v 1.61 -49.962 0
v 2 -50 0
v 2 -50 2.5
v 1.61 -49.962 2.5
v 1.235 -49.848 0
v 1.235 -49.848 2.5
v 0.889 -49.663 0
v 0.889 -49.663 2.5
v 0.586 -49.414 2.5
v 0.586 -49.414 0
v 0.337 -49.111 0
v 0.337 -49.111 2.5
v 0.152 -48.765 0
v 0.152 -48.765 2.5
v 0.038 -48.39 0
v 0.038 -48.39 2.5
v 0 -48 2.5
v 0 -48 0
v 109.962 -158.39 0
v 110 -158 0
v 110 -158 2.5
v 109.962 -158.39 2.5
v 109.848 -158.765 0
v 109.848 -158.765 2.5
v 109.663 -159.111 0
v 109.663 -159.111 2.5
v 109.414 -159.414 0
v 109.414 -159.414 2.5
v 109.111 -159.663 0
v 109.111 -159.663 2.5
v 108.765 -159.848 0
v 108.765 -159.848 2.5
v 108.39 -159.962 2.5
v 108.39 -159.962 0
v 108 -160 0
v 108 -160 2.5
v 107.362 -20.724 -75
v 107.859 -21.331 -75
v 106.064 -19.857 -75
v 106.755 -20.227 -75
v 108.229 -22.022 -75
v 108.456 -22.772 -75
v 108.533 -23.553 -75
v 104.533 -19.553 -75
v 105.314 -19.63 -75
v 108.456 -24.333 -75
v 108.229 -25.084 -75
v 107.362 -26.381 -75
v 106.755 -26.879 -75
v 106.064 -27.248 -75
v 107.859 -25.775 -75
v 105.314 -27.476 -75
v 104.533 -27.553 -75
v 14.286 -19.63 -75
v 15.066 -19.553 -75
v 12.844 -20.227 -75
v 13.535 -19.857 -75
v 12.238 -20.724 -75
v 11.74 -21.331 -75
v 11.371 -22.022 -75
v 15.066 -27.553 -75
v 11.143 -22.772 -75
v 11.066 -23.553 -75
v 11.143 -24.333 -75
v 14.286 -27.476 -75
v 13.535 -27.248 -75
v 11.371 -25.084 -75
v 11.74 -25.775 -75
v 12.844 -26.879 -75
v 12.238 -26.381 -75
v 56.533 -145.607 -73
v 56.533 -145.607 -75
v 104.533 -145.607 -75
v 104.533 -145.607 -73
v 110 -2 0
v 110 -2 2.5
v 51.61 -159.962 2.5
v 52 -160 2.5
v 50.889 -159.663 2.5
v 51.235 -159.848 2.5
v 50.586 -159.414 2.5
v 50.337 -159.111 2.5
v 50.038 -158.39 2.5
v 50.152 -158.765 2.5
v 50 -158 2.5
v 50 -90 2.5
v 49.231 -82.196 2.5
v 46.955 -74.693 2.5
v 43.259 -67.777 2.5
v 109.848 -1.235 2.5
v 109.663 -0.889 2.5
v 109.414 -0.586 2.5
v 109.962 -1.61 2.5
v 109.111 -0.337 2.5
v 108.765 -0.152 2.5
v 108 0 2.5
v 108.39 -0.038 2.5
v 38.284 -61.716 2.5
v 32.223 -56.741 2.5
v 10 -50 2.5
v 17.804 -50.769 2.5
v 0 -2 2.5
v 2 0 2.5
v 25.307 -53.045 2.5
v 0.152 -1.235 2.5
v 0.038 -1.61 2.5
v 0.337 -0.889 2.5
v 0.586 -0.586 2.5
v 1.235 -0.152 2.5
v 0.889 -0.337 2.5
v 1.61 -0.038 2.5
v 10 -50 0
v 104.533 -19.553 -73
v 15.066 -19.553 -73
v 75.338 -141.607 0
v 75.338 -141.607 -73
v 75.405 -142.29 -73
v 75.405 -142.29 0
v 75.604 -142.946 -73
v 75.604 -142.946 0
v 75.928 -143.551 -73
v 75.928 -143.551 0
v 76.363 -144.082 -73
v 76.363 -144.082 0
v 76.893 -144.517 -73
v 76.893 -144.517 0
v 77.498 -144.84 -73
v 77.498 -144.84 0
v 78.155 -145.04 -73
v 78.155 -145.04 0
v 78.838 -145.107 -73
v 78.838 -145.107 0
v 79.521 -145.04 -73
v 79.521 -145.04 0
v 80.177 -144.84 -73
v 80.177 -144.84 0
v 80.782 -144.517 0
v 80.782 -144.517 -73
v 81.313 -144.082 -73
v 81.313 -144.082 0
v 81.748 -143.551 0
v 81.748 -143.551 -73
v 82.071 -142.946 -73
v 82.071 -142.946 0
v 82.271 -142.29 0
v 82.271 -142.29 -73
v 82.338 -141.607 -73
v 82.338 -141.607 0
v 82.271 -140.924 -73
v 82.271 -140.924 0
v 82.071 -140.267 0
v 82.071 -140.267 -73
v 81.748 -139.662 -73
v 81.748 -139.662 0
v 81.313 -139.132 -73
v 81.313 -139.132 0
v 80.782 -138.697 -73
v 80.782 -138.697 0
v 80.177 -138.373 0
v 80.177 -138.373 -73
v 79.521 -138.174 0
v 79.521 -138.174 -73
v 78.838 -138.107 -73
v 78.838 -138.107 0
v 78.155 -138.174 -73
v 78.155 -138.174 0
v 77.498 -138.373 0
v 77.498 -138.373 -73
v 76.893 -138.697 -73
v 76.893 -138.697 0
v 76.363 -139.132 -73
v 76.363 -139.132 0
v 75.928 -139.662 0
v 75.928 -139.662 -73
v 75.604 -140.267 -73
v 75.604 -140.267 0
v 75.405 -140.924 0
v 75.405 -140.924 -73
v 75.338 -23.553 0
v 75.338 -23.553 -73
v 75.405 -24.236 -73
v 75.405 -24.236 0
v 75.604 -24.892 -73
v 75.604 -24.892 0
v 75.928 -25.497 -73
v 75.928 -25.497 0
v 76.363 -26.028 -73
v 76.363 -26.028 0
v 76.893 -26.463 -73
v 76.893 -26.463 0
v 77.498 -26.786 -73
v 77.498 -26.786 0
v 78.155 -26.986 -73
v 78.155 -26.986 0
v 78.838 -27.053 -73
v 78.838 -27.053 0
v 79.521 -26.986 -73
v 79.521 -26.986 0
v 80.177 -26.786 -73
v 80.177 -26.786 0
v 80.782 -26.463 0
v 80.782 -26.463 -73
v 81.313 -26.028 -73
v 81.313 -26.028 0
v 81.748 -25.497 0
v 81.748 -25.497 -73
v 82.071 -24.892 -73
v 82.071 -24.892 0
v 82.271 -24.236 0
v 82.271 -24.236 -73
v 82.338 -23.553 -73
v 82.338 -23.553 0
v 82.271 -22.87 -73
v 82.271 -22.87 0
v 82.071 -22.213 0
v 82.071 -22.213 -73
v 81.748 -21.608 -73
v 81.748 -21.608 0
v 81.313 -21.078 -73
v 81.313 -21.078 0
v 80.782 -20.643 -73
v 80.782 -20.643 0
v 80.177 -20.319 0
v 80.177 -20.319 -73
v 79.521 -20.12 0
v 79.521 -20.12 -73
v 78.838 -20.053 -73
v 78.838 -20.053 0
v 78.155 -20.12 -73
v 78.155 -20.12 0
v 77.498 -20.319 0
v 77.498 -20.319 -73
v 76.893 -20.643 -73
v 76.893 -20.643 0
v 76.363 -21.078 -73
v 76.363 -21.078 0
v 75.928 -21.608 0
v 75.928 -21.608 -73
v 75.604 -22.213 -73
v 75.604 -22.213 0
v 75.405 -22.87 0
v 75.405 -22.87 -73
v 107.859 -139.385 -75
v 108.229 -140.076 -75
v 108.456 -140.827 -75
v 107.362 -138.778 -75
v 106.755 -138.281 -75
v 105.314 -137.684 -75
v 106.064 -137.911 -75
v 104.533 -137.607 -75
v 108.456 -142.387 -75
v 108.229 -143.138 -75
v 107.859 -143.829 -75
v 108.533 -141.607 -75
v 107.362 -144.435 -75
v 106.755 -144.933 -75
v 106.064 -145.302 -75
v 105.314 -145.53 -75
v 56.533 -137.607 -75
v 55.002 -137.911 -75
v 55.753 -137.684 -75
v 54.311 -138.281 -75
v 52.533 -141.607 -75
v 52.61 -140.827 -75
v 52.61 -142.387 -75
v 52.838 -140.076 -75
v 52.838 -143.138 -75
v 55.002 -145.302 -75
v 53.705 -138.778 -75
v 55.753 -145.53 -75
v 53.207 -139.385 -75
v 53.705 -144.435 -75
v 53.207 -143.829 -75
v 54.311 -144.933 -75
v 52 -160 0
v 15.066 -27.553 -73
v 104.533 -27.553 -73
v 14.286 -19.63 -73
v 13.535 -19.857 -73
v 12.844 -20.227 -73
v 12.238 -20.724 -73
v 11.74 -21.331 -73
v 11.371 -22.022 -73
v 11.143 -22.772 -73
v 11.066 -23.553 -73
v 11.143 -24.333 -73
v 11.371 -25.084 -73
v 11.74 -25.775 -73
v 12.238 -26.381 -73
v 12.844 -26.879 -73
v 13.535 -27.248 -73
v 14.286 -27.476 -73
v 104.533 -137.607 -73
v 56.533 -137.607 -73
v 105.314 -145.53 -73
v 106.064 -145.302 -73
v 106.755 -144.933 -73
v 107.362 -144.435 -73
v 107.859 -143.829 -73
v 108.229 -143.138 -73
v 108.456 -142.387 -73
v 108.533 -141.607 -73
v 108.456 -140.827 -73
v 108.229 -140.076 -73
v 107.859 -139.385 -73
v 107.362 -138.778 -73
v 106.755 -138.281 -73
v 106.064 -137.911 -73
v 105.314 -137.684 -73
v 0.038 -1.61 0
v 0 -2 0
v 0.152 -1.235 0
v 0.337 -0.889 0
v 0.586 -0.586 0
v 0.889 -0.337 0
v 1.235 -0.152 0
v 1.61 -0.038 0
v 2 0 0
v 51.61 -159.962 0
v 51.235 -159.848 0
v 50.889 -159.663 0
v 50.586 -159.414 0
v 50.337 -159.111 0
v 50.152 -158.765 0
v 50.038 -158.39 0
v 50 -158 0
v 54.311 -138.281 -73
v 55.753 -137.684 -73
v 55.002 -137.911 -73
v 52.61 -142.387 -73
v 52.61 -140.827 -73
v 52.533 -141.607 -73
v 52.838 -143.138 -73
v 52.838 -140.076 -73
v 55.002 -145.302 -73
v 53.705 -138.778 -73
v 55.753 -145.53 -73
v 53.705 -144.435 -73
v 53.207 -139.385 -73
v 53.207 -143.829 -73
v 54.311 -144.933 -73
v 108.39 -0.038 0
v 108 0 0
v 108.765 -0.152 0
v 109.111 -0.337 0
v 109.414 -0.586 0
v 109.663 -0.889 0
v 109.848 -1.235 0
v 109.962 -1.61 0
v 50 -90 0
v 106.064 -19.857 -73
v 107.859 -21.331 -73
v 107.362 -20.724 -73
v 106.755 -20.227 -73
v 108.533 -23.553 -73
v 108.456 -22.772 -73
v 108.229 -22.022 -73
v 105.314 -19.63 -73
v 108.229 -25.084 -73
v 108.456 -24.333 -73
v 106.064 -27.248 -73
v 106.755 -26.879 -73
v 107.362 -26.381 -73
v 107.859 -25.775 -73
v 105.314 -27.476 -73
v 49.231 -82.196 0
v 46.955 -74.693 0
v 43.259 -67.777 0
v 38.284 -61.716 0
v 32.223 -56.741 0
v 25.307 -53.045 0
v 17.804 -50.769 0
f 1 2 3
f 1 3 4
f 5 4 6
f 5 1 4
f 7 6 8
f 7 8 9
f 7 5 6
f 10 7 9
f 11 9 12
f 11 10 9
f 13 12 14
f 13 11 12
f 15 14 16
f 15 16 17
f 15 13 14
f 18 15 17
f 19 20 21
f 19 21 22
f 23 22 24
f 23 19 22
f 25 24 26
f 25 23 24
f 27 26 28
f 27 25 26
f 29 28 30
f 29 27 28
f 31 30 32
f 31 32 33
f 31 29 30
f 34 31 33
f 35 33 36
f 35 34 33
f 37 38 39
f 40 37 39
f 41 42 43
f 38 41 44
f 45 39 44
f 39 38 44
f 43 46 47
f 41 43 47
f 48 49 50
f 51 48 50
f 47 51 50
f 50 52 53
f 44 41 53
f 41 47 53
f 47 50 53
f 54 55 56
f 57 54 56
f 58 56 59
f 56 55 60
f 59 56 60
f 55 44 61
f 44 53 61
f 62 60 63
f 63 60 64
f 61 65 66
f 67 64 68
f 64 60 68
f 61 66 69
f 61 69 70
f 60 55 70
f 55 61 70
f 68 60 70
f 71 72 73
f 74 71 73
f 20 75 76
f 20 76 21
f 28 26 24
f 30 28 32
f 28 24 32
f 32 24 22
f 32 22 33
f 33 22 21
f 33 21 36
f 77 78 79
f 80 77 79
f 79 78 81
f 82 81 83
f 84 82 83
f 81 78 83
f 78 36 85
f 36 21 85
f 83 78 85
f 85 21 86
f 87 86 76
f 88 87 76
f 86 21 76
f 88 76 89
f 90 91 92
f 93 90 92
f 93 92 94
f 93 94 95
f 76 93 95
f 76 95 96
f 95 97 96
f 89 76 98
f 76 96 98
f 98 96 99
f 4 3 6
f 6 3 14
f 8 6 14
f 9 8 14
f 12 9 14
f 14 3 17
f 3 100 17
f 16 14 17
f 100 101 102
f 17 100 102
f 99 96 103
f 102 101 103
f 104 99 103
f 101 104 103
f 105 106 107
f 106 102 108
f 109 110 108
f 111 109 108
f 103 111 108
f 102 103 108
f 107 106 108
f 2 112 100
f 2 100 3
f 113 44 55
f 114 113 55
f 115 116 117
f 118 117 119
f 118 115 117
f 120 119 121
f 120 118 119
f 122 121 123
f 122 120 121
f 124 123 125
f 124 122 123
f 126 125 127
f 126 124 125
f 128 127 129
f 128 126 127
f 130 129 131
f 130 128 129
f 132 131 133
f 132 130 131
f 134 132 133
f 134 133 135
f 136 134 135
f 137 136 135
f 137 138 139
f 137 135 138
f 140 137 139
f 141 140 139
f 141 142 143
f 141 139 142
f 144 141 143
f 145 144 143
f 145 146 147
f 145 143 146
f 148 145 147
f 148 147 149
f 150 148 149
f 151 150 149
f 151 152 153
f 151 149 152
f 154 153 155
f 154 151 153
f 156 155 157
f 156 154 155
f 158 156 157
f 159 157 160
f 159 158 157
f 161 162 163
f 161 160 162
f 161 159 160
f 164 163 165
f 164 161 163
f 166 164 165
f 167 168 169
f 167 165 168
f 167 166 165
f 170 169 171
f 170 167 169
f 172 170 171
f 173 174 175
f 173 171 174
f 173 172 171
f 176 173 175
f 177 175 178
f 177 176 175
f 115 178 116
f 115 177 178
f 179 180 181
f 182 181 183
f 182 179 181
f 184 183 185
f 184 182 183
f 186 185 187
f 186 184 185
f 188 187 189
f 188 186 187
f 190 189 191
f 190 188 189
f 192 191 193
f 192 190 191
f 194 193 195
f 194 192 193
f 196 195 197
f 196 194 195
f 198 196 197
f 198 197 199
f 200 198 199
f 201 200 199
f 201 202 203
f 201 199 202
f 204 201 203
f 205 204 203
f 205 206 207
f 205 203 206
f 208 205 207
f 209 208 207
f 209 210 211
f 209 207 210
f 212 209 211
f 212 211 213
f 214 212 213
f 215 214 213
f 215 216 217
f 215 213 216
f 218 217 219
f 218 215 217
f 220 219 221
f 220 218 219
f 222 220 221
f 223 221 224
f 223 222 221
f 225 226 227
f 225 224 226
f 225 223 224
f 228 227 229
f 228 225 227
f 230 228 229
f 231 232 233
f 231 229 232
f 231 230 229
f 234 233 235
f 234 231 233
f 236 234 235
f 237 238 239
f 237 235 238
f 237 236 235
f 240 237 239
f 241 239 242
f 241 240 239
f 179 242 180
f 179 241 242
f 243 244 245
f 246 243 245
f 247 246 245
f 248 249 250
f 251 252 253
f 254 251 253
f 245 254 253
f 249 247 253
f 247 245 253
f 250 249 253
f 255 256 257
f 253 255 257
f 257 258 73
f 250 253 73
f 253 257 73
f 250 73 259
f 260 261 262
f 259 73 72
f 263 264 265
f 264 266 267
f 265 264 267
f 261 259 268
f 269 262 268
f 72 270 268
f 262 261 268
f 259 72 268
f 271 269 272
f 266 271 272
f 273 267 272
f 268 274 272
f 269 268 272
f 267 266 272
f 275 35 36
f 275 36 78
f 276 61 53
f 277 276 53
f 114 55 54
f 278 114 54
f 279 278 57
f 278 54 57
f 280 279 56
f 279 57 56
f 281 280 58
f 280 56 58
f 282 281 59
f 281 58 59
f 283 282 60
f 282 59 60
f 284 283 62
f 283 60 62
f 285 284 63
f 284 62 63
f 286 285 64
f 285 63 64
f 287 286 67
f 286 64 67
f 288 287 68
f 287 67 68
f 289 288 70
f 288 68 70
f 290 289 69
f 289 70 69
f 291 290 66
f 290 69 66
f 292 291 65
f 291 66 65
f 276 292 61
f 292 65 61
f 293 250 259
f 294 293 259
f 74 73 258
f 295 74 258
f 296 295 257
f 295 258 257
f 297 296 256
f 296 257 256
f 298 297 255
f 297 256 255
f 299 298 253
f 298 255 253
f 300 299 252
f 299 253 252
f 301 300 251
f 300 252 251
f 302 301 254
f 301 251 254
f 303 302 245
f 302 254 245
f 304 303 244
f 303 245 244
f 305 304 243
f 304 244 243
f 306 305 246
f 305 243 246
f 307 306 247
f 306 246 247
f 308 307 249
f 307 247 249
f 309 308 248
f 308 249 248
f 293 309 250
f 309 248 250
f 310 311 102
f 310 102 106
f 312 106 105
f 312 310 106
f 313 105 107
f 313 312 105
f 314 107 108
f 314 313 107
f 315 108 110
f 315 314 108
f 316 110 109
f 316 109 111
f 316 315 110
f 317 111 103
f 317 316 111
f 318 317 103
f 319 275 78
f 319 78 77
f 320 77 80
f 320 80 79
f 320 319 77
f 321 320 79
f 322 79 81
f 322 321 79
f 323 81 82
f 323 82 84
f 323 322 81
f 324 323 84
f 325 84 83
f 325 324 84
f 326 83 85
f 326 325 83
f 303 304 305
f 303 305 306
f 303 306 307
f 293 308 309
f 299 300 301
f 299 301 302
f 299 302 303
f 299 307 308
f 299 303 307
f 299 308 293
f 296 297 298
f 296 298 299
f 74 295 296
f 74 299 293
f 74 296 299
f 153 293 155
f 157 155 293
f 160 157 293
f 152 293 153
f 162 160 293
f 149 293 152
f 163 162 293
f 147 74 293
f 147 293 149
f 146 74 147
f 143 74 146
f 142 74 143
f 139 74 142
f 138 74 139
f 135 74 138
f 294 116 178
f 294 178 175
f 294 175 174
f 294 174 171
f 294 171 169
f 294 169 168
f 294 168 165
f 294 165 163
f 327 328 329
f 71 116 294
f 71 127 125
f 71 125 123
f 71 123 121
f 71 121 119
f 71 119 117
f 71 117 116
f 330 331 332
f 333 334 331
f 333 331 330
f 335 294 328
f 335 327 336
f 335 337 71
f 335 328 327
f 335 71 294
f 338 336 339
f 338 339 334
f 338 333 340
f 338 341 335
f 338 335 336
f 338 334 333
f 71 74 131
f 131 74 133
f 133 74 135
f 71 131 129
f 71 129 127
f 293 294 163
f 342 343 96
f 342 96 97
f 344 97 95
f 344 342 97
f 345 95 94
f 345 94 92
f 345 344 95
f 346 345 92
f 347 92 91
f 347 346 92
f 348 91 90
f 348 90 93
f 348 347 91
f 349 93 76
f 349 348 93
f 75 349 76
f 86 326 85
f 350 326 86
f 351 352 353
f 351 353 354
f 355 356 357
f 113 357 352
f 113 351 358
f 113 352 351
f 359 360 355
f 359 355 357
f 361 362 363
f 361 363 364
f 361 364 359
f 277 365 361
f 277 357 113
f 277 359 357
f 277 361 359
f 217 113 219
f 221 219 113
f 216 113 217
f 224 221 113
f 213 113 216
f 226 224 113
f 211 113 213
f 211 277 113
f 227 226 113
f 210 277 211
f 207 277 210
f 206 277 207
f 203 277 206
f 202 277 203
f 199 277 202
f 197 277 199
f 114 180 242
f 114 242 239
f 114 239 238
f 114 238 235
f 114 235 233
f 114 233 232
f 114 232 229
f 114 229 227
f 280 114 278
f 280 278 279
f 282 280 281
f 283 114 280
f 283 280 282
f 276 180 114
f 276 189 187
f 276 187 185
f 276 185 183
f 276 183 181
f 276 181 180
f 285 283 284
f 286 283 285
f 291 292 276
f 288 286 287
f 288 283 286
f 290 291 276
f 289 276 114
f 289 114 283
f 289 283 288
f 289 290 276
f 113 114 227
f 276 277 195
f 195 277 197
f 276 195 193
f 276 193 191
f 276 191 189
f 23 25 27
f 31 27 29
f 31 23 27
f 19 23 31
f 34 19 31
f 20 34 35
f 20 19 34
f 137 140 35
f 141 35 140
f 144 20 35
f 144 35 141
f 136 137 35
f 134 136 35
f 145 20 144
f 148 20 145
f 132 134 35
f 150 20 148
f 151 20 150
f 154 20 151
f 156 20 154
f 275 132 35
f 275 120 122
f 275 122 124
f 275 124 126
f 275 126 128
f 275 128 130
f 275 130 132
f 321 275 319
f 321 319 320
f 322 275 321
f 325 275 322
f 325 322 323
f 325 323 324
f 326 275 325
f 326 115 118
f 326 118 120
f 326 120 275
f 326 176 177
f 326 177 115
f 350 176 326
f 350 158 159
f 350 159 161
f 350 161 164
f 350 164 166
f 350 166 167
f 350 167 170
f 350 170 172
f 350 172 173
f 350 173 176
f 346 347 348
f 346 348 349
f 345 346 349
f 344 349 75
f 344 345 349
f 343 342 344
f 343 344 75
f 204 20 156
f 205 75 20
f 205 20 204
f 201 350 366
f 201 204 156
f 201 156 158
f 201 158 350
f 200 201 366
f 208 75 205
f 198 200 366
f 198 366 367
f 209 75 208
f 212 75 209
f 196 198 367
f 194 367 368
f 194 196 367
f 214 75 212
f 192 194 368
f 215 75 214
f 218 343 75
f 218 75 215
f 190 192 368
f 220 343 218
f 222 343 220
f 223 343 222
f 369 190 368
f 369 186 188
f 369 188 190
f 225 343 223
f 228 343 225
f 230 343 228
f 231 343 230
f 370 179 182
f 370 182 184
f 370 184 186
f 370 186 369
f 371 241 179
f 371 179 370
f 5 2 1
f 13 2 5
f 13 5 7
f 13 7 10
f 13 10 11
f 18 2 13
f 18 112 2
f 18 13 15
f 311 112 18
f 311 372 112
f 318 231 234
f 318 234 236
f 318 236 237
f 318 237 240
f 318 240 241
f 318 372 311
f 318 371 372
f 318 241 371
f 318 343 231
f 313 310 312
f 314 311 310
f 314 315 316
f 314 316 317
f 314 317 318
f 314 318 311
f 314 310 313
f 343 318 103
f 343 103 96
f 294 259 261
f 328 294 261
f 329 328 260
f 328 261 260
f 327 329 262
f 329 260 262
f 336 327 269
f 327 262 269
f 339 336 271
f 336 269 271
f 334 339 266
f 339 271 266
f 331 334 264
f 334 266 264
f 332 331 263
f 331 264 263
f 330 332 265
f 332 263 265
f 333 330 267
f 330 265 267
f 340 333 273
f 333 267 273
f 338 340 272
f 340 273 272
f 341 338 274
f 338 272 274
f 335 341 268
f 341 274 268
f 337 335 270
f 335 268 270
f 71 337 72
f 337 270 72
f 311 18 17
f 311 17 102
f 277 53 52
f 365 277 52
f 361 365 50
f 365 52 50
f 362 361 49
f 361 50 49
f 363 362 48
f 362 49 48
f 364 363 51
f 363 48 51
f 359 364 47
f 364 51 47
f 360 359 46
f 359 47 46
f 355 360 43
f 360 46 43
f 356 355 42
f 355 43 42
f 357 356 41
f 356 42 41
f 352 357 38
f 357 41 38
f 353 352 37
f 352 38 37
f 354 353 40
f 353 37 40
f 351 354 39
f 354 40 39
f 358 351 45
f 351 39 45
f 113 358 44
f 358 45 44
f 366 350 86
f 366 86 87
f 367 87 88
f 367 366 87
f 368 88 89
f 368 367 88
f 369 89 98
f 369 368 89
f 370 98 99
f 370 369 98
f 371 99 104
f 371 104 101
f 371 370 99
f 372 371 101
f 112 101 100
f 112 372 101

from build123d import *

# Parameters (mm, degrees)
F1_DEPTH = 2.5
F2_R     = 3.5
F3_DEPTH = 75
F5_DEPTH = 2


with BuildPart() as f1:
    # F0 (on Top) → F1 (new body)
    with BuildSketch(Plane.XY):
        with BuildLine():
            ThreePointArc((0, -2), (-0.585786, -0.585786), (-2, 0))
            Line((-2, 0), (-108, 0))
            ThreePointArc((-108, 0), (-109.414214, -0.585786), (-110, -2))
            Line((-110, -2), (-110, -158))
            ThreePointArc((-110, -158), (-109.414214, -159.414214), (-108, -160))
            Line((-108, -160), (-52, -160))
            ThreePointArc((-52, -160), (-50.585786, -159.414214), (-50, -158))
            Line((-50, -158), (-50, -90))
            ThreePointArc((-50, -90), (-38.284271, -61.715729), (-10, -50))
            Line((-10, -50), (-2, -50))
            ThreePointArc((-2, -50), (-0.585786, -49.414214), (0, -48))
            Line((0, -48), (0, -2))
        make_face()
    extrude(amount=F1_DEPTH)

    # F2 (on face) → F3 (join)
    with BuildSketch(Plane(origin=(0, 0, 0), x_dir=(1, 0, 0), z_dir=(0, 0, -1))):
        with Locations((-78.837842, 141.606882)):
            Circle(F2_R)
        with Locations((-78.837842, 23.552824)):
            Circle(F2_R)
    extrude(amount=F3_DEPTH)

    # F4 (on face) → F5 (join)
    with BuildSketch(Plane(origin=(0, 0, -75), x_dir=(1, 0, 0), z_dir=(0, 0, -1))):
        with BuildLine():
            ThreePointArc((-56.533181, 137.606882), (-52.533181, 141.606882), (-56.533181, 145.606882))
            Line((-56.533181, 145.606882), (-104.533181, 145.606882))
            ThreePointArc((-104.533181, 145.606882), (-108.533181, 141.606882), (-104.533181, 137.606882))
            Line((-104.533181, 137.606882), (-56.533181, 137.606882))
        make_face()
        with BuildLine():
            ThreePointArc((-82.337842, 141.606882), (-78.837842, 145.106882), (-75.337842, 141.606882))
            ThreePointArc((-75.337842, 141.606882), (-78.837842, 138.106882), (-82.337842, 141.606882))
        make_face(mode=Mode.SUBTRACT)
        with BuildLine():
            ThreePointArc((-104.533181, 27.552824), (-108.533181, 23.552824), (-104.533181, 19.552824))
            Line((-104.533181, 19.552824), (-15.066023, 19.552824))
            ThreePointArc((-15.066023, 19.552824), (-11.066023, 23.552824), (-15.066023, 27.552824))
            Line((-15.066023, 27.552824), (-104.533181, 27.552824))
        make_face()
        with BuildLine():
            ThreePointArc((-82.337842, 23.552824), (-78.837842, 27.052824), (-75.337842, 23.552824))
            ThreePointArc((-75.337842, 23.552824), (-78.837842, 20.052824), (-82.337842, 23.552824))
        make_face(mode=Mode.SUBTRACT)
        with BuildLine():
            ThreePointArc((-82.337842, 23.552824), (-78.837842, 20.052824), (-75.337842, 23.552824))
            Line((-75.337842, 23.552824), (-82.337842, 23.552824))
        make_face()
    extrude(amount=-F5_DEPTH)


with BuildPart() as f6_1:
    # F6: instance of F1
    add(f1.part.mirror(Plane.YZ))


solid = f6_1.part
